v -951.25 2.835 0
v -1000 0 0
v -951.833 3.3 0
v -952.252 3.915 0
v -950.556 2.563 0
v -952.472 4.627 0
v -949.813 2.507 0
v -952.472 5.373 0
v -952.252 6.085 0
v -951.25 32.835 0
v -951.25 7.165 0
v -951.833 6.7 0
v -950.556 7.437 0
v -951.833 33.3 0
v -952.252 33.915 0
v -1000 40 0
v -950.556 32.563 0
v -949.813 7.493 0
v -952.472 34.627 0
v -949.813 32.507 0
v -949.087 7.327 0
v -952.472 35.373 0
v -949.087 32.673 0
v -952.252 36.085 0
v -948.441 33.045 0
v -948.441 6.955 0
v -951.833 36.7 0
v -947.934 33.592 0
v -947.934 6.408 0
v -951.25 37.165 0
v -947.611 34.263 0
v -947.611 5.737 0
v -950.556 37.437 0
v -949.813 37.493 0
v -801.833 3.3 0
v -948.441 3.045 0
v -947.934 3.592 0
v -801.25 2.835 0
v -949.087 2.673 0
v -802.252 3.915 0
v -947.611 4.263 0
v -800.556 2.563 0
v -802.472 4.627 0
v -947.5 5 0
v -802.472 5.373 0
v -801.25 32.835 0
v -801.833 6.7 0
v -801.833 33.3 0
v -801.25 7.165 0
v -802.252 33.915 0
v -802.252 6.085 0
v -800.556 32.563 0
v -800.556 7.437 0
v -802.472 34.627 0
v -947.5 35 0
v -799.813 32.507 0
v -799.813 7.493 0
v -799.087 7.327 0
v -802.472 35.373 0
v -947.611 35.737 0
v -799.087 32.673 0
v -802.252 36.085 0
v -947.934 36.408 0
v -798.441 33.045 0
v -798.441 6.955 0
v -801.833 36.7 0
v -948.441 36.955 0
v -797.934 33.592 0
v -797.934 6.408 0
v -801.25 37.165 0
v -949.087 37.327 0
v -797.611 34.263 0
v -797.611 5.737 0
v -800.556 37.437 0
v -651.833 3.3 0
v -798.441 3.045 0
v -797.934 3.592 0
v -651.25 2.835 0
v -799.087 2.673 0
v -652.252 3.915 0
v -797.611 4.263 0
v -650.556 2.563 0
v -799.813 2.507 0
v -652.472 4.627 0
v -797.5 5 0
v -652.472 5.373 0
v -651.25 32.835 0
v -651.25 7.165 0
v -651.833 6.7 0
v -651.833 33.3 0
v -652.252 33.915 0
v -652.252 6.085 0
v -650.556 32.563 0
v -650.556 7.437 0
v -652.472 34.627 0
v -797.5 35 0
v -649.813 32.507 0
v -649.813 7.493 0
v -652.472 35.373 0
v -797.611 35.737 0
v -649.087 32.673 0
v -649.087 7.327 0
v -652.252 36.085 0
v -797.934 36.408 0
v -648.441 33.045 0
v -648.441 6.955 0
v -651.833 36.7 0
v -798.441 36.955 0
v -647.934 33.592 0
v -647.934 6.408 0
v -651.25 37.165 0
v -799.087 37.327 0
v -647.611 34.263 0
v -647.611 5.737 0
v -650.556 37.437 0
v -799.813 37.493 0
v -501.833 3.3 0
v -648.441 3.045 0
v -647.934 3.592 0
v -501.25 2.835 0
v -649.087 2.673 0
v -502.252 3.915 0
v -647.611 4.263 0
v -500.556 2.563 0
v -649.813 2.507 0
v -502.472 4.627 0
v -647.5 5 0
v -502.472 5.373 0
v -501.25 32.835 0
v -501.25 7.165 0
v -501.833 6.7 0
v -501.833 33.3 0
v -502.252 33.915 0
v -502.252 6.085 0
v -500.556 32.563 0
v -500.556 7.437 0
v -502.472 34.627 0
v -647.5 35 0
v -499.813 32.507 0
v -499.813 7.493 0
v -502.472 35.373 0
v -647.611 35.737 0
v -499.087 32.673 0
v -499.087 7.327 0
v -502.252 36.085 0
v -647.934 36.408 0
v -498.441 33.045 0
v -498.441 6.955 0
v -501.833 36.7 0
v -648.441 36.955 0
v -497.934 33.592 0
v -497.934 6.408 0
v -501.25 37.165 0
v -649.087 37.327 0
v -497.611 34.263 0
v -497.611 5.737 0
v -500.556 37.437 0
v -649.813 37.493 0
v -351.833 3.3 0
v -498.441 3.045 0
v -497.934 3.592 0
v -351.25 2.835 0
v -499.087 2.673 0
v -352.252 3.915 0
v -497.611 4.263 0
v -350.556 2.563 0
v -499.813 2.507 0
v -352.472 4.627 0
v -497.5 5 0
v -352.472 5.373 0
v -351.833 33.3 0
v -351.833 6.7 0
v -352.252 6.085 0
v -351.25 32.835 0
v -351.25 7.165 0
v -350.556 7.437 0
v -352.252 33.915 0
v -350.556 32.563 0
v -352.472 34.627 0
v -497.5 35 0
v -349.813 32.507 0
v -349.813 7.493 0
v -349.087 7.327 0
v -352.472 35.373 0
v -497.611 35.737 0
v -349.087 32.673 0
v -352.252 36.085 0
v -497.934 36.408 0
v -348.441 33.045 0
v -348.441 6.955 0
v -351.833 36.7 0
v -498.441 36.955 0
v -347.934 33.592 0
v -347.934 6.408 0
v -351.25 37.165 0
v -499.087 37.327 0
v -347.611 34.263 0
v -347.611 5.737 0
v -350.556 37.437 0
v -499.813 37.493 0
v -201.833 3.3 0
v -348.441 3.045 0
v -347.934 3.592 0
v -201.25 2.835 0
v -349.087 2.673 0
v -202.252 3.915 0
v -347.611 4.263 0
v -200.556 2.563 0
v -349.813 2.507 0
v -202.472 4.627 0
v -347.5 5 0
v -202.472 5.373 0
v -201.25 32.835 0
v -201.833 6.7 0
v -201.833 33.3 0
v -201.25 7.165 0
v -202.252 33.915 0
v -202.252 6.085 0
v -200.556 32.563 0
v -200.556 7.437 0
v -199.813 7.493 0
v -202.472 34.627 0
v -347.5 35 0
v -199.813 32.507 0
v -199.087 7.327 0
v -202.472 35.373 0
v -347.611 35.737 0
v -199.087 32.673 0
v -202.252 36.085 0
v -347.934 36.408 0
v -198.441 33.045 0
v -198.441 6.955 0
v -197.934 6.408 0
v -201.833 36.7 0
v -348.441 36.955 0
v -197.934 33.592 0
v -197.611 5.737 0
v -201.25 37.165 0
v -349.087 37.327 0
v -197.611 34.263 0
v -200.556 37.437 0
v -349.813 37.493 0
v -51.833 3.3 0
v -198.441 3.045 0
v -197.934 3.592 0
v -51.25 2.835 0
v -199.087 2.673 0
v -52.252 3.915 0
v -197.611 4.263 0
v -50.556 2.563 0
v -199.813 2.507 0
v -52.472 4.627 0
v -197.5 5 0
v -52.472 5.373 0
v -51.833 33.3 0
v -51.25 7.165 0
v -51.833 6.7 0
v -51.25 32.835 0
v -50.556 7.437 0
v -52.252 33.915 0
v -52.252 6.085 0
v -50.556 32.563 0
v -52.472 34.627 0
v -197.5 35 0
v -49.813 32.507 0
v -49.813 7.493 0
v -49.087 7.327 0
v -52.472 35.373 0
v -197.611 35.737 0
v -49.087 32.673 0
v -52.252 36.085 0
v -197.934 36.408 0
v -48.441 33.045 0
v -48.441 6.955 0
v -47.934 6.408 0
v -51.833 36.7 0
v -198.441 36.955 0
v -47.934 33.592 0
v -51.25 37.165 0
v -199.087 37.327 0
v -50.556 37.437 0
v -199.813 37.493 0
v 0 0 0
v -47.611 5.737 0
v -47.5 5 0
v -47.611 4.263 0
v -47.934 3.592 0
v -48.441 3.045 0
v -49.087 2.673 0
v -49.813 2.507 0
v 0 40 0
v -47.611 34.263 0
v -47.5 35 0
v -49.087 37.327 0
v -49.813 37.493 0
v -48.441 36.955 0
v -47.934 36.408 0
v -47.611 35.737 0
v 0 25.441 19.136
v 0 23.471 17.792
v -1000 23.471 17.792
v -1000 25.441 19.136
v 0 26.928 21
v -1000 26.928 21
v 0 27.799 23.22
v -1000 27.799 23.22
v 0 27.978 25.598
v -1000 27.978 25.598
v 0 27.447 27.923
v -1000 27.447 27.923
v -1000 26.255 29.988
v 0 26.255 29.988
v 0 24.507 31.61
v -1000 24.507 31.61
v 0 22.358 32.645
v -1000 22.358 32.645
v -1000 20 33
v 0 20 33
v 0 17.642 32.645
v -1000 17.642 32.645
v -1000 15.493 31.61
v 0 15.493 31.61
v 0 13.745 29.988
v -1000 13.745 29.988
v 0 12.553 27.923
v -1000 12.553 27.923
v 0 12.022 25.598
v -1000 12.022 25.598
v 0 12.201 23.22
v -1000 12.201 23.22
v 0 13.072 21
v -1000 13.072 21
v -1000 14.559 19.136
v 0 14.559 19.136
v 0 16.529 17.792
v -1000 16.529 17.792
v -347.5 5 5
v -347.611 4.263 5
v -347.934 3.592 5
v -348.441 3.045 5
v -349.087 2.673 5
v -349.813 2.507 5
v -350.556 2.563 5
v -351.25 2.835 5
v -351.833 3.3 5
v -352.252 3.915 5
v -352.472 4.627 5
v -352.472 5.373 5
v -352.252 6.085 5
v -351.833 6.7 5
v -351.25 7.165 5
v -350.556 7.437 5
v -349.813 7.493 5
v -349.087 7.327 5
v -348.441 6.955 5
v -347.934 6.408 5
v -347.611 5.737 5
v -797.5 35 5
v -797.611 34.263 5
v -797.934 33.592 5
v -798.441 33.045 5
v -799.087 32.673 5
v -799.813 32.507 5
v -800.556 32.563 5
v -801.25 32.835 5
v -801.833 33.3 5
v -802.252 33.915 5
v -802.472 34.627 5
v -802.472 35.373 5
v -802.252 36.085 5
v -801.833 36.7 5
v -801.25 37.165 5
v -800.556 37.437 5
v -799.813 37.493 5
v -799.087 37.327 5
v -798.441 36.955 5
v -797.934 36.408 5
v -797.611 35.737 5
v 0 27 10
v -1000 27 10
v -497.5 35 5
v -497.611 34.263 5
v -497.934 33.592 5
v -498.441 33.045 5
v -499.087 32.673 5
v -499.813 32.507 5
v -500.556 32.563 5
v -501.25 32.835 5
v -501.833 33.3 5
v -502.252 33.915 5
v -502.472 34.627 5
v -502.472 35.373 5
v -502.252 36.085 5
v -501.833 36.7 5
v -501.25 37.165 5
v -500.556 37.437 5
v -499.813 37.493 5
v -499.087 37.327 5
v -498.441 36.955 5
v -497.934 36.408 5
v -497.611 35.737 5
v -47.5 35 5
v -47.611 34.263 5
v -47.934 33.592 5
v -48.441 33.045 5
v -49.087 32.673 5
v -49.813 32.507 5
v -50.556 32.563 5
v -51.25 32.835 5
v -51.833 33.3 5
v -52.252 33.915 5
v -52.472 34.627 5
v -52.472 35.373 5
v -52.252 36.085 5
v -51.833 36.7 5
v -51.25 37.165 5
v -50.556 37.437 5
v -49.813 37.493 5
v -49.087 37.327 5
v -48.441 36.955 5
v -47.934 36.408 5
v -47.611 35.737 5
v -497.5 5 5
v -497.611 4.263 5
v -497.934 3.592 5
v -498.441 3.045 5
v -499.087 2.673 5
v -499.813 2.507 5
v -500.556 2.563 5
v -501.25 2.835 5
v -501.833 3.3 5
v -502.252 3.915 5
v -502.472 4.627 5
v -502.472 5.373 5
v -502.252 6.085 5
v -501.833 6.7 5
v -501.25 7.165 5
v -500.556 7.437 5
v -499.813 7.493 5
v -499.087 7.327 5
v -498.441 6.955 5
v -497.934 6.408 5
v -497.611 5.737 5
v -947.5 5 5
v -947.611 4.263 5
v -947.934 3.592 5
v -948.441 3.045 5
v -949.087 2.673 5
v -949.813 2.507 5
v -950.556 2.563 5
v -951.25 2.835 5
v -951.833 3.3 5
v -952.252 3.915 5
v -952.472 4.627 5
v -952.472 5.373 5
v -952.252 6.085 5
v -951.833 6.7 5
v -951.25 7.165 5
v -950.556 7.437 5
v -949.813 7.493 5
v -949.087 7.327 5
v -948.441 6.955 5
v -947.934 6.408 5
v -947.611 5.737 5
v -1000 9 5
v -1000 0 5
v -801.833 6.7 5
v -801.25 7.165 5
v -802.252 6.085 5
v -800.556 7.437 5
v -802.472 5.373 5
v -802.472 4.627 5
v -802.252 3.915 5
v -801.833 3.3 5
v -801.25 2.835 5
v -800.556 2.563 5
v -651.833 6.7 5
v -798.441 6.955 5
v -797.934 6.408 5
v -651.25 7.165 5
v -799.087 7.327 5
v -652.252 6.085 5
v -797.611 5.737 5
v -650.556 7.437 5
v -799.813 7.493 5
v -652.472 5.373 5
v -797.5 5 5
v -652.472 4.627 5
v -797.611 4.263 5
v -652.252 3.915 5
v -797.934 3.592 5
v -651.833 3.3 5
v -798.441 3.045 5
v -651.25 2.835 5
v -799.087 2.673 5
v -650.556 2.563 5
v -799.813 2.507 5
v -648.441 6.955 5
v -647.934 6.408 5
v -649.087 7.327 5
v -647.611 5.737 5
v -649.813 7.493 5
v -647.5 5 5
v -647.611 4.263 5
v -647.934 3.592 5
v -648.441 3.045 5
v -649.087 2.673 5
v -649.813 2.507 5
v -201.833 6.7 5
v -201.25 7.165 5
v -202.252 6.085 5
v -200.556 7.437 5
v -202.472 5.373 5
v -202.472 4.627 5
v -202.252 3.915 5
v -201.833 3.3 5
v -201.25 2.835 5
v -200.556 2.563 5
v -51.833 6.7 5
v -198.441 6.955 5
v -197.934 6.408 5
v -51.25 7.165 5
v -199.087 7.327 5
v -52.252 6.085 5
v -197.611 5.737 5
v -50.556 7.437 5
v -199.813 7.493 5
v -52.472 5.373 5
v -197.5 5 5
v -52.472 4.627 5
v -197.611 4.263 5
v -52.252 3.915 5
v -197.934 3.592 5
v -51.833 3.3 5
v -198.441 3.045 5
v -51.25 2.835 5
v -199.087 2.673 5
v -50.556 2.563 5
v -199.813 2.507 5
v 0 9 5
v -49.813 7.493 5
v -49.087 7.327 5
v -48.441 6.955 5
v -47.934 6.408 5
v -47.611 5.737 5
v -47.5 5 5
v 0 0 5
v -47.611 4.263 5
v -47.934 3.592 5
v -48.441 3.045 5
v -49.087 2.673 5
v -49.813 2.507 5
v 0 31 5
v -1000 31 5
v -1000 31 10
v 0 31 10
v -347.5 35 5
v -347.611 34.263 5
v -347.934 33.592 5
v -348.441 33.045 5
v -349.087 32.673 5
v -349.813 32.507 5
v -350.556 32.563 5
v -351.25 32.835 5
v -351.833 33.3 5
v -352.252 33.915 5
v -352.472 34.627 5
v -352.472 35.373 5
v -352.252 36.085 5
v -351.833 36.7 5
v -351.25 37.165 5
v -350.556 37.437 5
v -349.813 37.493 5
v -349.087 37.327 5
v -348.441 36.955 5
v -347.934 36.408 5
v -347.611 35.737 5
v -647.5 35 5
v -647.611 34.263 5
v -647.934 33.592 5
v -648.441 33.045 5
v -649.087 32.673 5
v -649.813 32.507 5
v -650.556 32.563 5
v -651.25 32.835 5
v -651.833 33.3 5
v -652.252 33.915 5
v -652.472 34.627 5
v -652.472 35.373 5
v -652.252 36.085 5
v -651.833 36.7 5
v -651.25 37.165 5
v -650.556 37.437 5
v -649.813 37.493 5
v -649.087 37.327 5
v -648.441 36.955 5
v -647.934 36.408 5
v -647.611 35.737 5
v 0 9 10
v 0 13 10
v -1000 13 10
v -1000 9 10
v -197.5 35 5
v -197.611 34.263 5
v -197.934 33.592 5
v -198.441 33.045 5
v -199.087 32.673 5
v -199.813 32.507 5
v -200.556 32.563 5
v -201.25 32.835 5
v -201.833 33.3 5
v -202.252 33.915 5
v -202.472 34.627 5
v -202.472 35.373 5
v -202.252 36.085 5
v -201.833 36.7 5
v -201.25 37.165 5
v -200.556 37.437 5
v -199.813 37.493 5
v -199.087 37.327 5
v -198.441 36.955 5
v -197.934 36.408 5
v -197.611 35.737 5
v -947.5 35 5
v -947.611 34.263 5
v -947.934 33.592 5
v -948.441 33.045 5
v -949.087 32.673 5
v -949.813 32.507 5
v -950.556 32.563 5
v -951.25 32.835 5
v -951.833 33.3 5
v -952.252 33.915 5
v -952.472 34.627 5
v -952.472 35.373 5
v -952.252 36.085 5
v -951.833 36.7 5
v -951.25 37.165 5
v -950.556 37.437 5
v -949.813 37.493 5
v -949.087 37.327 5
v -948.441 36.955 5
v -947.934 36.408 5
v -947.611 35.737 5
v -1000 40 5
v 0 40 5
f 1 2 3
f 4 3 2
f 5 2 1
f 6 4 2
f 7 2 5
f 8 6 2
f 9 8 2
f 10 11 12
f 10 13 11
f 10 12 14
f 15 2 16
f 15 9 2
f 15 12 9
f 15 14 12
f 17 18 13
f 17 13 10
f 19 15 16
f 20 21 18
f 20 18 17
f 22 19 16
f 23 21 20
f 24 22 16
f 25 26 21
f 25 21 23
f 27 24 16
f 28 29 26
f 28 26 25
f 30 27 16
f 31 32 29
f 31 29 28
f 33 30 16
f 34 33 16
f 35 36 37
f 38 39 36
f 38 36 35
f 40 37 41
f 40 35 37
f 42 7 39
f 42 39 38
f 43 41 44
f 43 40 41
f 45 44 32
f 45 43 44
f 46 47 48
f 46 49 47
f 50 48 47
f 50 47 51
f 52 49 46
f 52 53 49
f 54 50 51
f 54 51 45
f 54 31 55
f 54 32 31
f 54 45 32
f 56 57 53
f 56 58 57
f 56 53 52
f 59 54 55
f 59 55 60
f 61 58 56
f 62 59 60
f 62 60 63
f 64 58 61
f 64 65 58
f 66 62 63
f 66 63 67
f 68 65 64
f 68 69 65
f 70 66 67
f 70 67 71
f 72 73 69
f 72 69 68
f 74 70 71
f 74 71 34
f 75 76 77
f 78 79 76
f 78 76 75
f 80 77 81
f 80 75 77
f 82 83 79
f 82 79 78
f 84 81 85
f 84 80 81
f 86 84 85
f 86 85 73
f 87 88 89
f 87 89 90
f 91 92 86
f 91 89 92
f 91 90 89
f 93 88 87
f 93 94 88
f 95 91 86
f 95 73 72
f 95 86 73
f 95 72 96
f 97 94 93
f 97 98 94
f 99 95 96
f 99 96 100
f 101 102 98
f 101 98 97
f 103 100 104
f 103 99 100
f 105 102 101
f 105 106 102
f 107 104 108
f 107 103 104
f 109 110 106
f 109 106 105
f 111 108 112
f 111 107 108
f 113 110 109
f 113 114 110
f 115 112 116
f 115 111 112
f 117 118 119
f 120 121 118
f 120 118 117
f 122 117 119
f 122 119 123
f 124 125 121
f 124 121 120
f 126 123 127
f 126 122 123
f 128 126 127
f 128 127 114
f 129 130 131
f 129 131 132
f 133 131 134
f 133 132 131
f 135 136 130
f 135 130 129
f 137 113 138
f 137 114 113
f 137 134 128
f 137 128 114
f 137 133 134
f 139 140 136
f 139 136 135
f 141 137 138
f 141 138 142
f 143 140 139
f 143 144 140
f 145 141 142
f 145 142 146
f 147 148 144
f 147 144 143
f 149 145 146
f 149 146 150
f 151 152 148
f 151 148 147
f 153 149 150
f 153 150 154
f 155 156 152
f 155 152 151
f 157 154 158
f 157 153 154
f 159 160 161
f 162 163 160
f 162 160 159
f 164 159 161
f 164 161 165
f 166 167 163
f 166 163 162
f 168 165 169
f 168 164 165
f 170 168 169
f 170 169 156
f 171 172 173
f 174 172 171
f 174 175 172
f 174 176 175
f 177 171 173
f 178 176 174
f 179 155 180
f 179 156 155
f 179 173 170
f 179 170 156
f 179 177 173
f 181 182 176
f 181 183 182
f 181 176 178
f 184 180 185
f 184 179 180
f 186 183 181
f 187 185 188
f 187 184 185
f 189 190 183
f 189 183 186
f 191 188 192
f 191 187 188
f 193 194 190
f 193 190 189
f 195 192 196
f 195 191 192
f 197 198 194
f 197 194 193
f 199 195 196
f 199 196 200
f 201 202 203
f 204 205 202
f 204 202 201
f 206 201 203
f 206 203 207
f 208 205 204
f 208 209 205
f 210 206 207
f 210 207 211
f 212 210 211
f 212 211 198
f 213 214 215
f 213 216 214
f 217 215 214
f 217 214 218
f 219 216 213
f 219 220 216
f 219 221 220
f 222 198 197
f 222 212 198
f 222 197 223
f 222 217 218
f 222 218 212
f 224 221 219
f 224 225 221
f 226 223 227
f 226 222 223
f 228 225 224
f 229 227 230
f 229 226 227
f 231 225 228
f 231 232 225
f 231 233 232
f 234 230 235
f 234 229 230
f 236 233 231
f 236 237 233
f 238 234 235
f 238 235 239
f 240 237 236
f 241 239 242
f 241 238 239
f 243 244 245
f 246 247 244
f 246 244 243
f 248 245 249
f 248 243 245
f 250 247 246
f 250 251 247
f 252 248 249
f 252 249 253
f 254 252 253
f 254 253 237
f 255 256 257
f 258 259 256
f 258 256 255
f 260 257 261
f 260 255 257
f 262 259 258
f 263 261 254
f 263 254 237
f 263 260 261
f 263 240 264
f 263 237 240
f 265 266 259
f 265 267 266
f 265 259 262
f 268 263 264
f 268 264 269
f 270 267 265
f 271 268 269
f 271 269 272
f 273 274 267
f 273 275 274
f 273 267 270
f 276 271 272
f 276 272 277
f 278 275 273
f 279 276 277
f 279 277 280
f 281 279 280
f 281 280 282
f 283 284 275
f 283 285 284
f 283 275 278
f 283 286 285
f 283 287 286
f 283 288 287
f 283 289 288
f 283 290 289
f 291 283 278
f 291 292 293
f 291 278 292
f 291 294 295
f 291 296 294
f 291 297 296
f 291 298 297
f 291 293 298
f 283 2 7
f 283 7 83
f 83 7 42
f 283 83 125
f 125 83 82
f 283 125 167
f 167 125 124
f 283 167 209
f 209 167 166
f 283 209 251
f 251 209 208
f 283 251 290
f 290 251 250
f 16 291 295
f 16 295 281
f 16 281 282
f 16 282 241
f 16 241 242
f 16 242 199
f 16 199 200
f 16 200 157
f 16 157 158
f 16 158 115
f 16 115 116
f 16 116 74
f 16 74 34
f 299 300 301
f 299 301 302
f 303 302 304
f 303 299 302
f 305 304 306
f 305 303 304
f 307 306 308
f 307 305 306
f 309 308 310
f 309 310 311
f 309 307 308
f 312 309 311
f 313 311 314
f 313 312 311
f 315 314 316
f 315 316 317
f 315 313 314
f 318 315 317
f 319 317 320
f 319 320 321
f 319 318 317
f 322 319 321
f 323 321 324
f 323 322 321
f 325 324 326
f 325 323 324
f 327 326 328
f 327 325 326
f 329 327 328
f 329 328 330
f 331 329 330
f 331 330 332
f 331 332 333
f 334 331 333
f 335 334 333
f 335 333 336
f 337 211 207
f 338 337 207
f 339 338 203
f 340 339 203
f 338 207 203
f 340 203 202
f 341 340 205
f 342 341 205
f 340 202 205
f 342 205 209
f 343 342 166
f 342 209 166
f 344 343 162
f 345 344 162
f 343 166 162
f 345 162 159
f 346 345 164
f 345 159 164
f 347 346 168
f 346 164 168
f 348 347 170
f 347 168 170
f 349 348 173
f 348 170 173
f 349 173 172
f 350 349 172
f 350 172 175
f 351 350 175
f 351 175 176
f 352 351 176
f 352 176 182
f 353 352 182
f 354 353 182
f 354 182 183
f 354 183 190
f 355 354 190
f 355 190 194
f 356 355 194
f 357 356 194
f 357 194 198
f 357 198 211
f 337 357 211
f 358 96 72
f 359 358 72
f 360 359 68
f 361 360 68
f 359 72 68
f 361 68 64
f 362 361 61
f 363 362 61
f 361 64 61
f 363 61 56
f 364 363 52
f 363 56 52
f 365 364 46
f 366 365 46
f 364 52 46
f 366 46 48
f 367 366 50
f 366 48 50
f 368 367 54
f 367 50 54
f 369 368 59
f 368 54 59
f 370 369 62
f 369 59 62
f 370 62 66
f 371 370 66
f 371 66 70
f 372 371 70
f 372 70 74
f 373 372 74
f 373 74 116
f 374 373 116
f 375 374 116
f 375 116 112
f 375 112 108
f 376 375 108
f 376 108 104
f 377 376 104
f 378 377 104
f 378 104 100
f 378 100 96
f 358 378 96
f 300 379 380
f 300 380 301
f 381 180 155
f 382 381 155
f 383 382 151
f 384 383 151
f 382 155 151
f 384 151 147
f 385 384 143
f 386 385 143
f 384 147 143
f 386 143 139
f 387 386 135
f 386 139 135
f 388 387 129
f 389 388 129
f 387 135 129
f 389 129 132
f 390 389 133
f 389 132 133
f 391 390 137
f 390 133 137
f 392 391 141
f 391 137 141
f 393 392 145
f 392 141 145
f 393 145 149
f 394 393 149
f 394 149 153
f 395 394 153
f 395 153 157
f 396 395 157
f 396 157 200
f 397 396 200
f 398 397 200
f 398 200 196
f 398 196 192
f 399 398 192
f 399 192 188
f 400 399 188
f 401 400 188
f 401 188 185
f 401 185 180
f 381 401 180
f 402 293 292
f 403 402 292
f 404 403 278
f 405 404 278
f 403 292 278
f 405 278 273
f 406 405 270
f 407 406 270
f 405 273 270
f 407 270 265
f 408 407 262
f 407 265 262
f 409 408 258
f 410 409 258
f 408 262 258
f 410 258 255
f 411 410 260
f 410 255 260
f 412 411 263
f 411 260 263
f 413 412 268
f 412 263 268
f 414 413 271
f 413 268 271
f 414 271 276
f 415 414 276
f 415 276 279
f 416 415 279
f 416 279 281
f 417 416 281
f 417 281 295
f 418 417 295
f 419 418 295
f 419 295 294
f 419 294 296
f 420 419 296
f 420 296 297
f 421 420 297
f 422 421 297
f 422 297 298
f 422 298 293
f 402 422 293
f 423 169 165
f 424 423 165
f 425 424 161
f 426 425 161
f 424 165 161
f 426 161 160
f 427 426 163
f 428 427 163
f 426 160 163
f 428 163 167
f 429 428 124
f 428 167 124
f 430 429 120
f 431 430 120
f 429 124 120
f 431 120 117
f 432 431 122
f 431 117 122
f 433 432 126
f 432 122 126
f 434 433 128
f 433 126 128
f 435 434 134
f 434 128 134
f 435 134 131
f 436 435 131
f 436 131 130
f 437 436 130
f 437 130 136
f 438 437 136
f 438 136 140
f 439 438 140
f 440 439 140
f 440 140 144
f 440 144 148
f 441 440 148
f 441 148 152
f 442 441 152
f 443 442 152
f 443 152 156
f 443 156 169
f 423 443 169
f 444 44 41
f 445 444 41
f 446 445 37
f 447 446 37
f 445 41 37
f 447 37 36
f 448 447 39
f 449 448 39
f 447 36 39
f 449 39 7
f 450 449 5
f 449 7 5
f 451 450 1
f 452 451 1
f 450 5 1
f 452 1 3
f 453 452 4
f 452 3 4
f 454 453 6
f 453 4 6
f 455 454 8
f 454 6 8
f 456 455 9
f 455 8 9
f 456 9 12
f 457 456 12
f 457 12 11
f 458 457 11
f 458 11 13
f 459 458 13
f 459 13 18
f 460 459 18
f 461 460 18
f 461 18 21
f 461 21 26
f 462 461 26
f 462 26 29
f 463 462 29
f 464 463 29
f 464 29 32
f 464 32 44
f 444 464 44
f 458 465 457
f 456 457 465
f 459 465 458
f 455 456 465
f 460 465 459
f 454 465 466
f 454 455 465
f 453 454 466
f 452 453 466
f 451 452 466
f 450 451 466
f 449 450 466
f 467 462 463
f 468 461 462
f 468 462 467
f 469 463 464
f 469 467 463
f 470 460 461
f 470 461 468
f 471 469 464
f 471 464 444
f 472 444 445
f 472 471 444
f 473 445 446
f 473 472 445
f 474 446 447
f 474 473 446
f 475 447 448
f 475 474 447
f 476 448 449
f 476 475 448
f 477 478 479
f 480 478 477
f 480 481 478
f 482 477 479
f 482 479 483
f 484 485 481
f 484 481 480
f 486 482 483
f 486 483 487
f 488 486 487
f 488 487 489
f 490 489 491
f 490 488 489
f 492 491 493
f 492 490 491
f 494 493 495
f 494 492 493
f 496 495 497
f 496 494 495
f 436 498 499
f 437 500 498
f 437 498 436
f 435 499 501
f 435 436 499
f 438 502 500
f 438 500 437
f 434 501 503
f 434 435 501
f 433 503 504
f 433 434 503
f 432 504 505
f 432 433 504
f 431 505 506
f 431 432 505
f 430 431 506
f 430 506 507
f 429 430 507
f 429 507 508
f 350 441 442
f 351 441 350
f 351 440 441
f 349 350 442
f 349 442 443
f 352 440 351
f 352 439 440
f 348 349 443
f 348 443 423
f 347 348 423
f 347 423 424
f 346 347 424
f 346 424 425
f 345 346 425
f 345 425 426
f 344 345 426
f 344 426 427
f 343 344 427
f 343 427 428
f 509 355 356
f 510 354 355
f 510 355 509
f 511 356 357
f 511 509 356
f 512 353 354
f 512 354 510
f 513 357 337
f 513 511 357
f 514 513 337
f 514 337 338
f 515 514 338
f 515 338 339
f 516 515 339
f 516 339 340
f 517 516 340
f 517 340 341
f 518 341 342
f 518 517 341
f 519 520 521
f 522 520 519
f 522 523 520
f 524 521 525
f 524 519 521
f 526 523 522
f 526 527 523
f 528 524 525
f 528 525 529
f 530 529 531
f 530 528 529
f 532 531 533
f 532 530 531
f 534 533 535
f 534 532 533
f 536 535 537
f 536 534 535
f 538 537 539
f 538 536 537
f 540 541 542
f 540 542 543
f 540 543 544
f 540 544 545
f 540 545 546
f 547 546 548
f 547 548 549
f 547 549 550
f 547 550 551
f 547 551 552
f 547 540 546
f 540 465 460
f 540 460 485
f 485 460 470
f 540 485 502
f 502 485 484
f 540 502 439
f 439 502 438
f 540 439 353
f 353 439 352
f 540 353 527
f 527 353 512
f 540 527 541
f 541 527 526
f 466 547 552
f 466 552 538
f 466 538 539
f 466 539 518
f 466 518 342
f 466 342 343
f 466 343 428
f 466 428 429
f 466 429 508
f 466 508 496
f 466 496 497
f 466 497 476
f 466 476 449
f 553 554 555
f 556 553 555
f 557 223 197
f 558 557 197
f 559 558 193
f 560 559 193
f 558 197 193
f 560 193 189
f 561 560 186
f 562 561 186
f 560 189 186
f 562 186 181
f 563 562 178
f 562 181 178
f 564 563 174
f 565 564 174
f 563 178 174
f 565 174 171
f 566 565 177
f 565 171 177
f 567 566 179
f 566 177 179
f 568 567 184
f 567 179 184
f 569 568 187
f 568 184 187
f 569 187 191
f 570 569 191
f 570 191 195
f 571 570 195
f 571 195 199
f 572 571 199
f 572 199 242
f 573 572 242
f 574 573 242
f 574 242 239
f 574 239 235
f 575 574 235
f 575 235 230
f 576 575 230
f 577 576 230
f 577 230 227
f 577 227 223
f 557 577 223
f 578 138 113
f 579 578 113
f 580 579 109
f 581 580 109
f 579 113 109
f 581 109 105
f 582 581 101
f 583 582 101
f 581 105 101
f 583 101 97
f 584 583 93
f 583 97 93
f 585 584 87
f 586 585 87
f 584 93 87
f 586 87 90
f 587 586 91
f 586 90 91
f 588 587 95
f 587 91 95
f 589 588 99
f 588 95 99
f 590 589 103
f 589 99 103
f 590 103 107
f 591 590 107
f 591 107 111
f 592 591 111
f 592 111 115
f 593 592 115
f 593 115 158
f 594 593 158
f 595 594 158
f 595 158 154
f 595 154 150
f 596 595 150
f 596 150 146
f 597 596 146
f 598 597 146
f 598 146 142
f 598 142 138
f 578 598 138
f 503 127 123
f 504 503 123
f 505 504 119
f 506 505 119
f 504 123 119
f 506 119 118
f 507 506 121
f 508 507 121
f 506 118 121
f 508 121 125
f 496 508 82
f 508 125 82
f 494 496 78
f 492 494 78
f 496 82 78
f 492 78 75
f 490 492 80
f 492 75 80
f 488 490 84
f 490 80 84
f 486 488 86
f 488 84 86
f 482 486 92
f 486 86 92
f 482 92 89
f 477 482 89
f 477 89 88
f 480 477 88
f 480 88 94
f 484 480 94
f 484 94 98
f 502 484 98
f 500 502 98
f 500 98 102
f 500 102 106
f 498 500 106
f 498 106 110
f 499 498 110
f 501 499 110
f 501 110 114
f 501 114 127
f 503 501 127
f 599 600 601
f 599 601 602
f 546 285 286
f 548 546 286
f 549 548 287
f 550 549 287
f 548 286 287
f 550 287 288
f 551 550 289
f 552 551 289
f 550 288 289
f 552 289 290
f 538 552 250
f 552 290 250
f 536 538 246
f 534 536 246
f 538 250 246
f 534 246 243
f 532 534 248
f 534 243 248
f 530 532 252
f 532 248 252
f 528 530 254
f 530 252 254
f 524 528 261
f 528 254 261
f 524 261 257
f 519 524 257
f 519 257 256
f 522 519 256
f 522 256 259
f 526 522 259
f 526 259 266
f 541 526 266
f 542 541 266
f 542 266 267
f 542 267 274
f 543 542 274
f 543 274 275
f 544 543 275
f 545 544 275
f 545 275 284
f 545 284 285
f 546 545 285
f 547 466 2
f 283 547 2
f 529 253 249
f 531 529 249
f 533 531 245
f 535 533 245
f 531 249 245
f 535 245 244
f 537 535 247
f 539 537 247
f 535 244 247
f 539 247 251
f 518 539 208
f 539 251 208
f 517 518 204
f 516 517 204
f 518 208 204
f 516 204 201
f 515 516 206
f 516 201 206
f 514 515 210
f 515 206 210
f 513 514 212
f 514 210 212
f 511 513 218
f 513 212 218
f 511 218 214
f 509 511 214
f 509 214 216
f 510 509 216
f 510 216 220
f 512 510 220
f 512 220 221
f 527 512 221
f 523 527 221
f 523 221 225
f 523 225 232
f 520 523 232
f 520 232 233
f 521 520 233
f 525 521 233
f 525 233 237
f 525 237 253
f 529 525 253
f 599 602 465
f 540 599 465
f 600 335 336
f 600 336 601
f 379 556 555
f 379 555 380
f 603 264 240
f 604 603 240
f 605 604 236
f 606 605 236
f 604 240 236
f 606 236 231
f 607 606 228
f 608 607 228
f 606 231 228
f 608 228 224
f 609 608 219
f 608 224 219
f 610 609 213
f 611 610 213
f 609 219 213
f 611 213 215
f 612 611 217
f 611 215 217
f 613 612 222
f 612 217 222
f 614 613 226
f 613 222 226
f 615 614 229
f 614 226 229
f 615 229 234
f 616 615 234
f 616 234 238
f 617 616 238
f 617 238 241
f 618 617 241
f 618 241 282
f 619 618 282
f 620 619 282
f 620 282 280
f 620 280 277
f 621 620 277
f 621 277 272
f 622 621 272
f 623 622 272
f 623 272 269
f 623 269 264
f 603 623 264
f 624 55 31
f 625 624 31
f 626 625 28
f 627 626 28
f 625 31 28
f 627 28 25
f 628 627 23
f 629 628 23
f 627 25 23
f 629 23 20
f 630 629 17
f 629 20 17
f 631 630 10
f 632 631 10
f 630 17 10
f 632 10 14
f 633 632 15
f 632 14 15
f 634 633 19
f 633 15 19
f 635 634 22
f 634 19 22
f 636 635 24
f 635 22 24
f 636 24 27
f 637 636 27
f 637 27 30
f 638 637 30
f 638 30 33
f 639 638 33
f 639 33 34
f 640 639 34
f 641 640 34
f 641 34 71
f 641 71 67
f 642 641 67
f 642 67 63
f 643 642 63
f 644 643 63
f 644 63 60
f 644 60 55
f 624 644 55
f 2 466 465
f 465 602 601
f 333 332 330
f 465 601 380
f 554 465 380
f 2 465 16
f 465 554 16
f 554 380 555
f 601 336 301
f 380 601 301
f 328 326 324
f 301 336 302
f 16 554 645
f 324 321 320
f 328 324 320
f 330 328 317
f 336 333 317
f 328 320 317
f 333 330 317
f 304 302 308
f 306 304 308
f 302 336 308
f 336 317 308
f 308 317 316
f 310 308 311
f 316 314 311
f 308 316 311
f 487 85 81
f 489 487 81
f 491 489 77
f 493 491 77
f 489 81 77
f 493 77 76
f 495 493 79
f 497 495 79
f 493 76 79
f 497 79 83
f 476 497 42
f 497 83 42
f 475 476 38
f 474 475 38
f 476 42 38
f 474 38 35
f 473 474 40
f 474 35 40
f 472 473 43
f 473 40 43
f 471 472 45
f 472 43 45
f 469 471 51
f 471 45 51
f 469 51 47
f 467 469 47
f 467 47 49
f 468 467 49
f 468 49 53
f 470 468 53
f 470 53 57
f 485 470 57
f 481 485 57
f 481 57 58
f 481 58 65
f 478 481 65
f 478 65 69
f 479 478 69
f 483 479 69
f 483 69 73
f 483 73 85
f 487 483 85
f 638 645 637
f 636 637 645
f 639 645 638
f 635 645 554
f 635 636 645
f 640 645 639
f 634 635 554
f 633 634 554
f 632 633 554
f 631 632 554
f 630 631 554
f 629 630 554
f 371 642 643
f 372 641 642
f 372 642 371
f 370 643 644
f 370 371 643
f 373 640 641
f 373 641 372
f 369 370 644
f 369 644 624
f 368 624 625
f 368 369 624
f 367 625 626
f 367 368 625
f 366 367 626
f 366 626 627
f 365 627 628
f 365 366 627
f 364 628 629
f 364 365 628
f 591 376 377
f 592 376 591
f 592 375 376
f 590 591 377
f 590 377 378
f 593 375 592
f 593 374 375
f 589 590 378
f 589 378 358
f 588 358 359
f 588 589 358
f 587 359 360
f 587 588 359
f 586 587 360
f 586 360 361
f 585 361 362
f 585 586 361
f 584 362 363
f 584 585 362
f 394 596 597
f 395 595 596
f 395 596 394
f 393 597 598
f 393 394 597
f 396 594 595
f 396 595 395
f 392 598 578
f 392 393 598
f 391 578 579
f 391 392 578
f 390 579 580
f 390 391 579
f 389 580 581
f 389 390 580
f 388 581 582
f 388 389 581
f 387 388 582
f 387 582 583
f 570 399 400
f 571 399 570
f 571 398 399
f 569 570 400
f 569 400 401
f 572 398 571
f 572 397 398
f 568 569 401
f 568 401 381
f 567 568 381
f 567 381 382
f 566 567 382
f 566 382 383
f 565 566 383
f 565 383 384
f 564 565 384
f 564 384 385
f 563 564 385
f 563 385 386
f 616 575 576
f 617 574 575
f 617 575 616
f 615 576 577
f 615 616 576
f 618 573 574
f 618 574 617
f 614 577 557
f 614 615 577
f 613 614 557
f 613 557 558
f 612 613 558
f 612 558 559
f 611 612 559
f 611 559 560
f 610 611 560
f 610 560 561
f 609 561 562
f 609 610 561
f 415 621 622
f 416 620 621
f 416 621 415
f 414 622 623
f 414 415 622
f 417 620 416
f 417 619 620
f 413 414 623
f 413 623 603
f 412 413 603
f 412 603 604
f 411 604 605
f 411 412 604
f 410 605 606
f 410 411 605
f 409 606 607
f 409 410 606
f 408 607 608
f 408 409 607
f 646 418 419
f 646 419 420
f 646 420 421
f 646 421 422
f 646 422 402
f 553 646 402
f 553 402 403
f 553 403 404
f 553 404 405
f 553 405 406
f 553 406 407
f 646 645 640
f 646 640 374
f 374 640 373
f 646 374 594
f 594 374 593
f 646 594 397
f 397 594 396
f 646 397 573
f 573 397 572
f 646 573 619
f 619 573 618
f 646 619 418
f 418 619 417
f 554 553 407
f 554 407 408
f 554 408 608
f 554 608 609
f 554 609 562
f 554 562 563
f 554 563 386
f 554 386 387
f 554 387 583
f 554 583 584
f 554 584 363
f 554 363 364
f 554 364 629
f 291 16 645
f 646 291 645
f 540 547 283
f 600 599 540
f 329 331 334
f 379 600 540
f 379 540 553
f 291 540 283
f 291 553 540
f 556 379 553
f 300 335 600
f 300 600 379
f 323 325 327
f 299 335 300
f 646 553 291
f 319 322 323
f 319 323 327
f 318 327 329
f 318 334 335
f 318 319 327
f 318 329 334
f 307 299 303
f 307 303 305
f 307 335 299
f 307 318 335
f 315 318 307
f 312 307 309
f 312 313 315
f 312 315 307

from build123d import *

# Parameters (mm, degrees)
F1_DEPTH = 1000
F2_R     = 2.5
F3_DEPTH = 33.001


with BuildPart() as f1:
    # F0 (on Right) → F1 (new body)
    with BuildSketch(Plane.YZ):
        with BuildLine():
            Line((0, 5), (0, 0))
            Line((0, 0), (40, 0))
            Line((40, 0), (40, 5))
            Line((40, 5), (31, 5))
            Line((31, 5), (31, 10))
            Line((31, 10), (27, 10))
            Line((27, 10), (23.471015, 17.792222))
            ThreePointArc((23.471015, 17.792222), (20, 33), (16.528985, 17.792222))
            Line((16.528985, 17.792222), (13, 10))
            Line((13, 10), (9, 10))
            Line((9, 10), (9, 5))
            Line((9, 5), (0, 5))
        make_face()
    extrude(amount=-F1_DEPTH)

    # F2 (on face) → F3 (cut, through all)
    with BuildSketch(Plane(origin=(0, 0, 0), x_dir=(1, 0, 0), z_dir=(0, 0, -1))):
        with Locations((-50, -5)):
            Circle(F2_R)
        with Locations((-200, -5)):
            Circle(F2_R)
        with Locations((-350, -5)):
            Circle(F2_R)
        with Locations((-500, -5)):
            Circle(F2_R)
        with Locations((-650, -5)):
            Circle(F2_R)
        with Locations((-800, -5)):
            Circle(F2_R)
        with Locations((-950, -5)):
            Circle(F2_R)
        with Locations((-950, -35)):
            Circle(F2_R)
        with Locations((-800, -35)):
            Circle(F2_R)
        with Locations((-650, -35)):
            Circle(F2_R)
        with Locations((-500, -35)):
            Circle(F2_R)
        with Locations((-350, -35)):
            Circle(F2_R)
        with Locations((-200, -35)):
            Circle(F2_R)
        with Locations((-50, -35)):
            Circle(F2_R)
    extrude(amount=-F3_DEPTH, mode=Mode.SUBTRACT)


solid = f1.part
